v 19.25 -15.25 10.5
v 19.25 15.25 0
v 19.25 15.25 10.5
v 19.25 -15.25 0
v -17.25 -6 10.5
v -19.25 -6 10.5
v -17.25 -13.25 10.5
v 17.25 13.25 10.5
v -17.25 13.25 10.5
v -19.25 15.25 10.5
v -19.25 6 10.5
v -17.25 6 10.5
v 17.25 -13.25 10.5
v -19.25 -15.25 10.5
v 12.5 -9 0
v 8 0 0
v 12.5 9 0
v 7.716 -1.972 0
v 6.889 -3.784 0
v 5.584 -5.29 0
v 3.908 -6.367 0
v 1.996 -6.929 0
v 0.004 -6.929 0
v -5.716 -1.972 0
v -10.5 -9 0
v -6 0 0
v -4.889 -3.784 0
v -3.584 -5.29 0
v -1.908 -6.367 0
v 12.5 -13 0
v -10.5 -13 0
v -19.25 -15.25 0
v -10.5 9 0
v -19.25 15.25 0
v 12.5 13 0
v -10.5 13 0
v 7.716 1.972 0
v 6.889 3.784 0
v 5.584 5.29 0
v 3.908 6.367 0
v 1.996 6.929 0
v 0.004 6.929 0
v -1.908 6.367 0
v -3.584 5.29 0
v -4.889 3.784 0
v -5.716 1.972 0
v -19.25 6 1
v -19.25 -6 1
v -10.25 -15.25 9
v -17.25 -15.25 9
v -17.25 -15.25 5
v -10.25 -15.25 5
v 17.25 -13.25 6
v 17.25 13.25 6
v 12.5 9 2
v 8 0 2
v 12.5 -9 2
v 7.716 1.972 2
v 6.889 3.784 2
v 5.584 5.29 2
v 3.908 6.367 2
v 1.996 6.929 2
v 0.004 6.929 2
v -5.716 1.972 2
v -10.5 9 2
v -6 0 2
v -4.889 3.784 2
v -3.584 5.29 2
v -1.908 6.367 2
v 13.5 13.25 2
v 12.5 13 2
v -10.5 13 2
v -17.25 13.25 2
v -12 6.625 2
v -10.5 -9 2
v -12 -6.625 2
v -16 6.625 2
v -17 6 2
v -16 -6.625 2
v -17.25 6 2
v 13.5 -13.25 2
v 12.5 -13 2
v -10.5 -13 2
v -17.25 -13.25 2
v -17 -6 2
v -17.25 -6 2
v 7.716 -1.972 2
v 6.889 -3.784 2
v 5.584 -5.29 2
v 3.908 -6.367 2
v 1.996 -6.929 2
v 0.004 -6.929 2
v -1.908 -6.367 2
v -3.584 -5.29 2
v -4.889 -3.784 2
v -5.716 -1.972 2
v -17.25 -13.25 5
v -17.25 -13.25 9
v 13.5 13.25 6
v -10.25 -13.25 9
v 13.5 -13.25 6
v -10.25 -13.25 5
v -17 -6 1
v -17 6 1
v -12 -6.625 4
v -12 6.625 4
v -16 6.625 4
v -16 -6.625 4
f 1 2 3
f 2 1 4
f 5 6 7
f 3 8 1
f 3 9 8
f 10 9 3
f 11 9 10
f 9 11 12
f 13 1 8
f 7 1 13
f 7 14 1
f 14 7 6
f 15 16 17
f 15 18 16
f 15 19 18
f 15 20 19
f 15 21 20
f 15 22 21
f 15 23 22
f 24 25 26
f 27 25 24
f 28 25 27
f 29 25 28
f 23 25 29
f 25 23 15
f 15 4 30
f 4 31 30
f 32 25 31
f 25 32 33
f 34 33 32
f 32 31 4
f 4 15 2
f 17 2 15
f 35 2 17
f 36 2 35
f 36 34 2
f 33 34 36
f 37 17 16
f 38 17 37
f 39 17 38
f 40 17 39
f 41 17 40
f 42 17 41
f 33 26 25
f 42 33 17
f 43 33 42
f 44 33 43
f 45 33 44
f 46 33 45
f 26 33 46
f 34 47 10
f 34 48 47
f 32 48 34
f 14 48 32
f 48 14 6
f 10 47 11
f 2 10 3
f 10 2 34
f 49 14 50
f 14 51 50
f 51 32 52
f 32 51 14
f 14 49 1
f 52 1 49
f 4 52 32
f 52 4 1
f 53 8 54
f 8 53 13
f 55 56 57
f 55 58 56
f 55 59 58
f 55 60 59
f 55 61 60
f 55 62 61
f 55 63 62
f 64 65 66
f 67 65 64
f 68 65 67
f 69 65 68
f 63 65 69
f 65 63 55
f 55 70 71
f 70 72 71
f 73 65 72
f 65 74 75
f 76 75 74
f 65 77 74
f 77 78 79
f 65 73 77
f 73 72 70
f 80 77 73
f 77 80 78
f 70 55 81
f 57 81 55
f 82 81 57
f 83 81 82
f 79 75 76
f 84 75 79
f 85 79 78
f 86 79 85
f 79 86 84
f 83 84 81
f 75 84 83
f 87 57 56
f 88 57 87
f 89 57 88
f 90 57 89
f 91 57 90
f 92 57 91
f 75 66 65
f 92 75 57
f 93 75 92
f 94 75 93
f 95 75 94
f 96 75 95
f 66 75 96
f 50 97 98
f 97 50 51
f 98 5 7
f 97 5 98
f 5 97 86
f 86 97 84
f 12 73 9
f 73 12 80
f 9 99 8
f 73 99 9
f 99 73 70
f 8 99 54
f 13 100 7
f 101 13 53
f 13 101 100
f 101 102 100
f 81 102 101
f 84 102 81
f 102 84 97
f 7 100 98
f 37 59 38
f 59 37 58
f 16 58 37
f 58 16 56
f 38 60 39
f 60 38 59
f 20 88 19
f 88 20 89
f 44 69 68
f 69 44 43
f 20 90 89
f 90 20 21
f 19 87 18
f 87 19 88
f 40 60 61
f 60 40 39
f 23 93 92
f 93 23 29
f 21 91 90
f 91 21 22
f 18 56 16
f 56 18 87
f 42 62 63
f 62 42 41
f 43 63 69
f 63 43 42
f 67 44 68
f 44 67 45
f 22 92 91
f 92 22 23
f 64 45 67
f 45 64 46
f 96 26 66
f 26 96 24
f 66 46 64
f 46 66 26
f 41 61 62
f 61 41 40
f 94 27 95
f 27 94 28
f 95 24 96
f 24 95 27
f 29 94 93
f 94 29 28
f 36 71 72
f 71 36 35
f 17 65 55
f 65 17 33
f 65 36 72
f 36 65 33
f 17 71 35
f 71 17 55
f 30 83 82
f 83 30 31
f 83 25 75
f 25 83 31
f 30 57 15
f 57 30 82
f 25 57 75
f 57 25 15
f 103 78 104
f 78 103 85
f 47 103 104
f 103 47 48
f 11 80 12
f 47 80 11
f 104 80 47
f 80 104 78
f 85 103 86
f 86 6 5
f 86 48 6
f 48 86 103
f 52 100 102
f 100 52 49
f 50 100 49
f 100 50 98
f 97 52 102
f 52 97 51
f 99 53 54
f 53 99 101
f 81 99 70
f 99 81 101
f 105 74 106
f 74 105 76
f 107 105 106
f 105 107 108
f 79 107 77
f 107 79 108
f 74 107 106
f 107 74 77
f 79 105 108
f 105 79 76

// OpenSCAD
microsd_height = 0.0;

// do not need to modify anything below here
thickness = 2.0;
fudge = 0.1;

vemos_width = 38.5;
vemos_length = 30.50;
vemos_height = 10.5;
 
cavity_width = (vemos_width) - (2 * thickness);
cavity_length = (vemos_length) - (2 * thickness);
cavity_height = vemos_height - thickness + fudge;

hole_diameter = 7.0;

slit_width = 4.0;
slit_height = 23.0;

/*
Base
Min requirements. Values must not be less than the min reequirements.
width = 38.50 + a
length = 30.50 + b
heights = 10.5 + c
base(a, b, c)
*/
base(0, 0, 0);

/*
Lid
Min requirements. Values must not be less than the min reequirements.
width = 38.50 + a
length = 30.50 + b
heights = 2.0 + c (only change if absolute necessary)
base(a, b, c)
*/
//lid(0, 0, 0);

// lid
module lid(a, b, c) 
{
    difference() 
    {
        union () 
        {
             translate([12.95, 22.25, 3]) cube([4.0, cavity_length-0.3, 2.0]);
             translate([-(vemos_width / 2.0), 20, 0.0]) cube([vemos_width + a, vemos_length + b , 3]);
             translate([-(cavity_width / 2.0), 22+0.25, 2.0]) cube([cavity_width-0.3, cavity_length-0.3, 2.5 + c]);            
        }
         translate([1, 22 + (cavity_length / 2), 2.5 + (c/2)]) cylinder(h = 5 + fudge + c, r1 = hole_diameter, r2 =hole_diameter, center = true);
         rotate([0, 0, 90]) translate([21.9, -12.5, 0]) cube([slit_width, slit_height, 10 + c]);
         rotate([0, 0, 90]) translate([44.6, -12.5, 0]) cube([slit_width, slit_height, 10 + c]);
         translate([-20 ,30 , 0.75]) cube([10, 10, 4 + c]);
     }
}

// base
module base(a, b ,c)
{
    union() 
    {
        translate([13.5, -(cavity_length / 2.0), thickness]) cube([4.0, cavity_length, 4.0]);
        translate([-16, -((cavity_length/2) / 2.0), 2])cube([4.0, cavity_length/2, 2.0]);

        difference () 
        {
            translate([0, 0, vemos_height / 2.0]) cube([vemos_width + a, vemos_length + b, vemos_height + c], center = true); 
            translate([0, 0, ((cavity_height + c) / 2.0) + thickness]) cube([cavity_width, cavity_length, cavity_height +c], center = true);
            translate([1, 0, ((thickness - 1) - (c-1)) / 2.0]) cylinder(h = thickness + fudge + c, r1 = hole_diameter, r2 = hole_diameter, center = true);
            rotate([0, 0, 90]) translate([9, -12.5, -((1+c)/2)]) cube([slit_width, slit_height, 5 + c]);
            rotate([0, 0, 90]) translate([-13, -12.5, -((1+c)/2)]) cube([slit_width, slit_height, 5 + c]);
            translate([(-20 -a), -6, 1]) cube([3 + a, 12, 12 + c]);
            translate([-17.25, -16.0, 5]) cube([7, 4, 4]);        
        }
    }
}

// // base
// module base(a, b , c)
// {
//     union() 
//     {
//         translate([13.5, -(cavity_depth / 2.0), 2]) cube([4.0, cavity_depth, 4.0]);
//         translate([-16, -((cavity_depth/2) / 2.0), 2]) cube([4.0, cavity_depth/2, 2.0]);

//         difference () 
//         {
//             translate([0, 0, vemos_height / 2.0]) #cube([a, b, c], center = true); 
//             translate([0, 0, (cavity_height / 2.0) + thickness]) cube([cavity_width, cavity_depth, cavity_height], center = true);
//             translate([1, 0, thickness / 2.0]) cylinder(h = thickness + fudge, r1 = hole_diameter, r2 = hole_diameter, center = true);
//             rotate([0, 0, 90]) translate([9, -12.5, 0]) cube([slit_width, slit_height, 5]);
//             rotate([0, 0, 90]) translate([-13, -12.5, 0]) cube([slit_width, slit_height, 5]);
//             translate([-20, -6, 1]) cube([3, 12, 12]);
//             translate([-17.25, -16.0, 5]) cube([7, 4, 4]);        
//         }
//     }
// }
